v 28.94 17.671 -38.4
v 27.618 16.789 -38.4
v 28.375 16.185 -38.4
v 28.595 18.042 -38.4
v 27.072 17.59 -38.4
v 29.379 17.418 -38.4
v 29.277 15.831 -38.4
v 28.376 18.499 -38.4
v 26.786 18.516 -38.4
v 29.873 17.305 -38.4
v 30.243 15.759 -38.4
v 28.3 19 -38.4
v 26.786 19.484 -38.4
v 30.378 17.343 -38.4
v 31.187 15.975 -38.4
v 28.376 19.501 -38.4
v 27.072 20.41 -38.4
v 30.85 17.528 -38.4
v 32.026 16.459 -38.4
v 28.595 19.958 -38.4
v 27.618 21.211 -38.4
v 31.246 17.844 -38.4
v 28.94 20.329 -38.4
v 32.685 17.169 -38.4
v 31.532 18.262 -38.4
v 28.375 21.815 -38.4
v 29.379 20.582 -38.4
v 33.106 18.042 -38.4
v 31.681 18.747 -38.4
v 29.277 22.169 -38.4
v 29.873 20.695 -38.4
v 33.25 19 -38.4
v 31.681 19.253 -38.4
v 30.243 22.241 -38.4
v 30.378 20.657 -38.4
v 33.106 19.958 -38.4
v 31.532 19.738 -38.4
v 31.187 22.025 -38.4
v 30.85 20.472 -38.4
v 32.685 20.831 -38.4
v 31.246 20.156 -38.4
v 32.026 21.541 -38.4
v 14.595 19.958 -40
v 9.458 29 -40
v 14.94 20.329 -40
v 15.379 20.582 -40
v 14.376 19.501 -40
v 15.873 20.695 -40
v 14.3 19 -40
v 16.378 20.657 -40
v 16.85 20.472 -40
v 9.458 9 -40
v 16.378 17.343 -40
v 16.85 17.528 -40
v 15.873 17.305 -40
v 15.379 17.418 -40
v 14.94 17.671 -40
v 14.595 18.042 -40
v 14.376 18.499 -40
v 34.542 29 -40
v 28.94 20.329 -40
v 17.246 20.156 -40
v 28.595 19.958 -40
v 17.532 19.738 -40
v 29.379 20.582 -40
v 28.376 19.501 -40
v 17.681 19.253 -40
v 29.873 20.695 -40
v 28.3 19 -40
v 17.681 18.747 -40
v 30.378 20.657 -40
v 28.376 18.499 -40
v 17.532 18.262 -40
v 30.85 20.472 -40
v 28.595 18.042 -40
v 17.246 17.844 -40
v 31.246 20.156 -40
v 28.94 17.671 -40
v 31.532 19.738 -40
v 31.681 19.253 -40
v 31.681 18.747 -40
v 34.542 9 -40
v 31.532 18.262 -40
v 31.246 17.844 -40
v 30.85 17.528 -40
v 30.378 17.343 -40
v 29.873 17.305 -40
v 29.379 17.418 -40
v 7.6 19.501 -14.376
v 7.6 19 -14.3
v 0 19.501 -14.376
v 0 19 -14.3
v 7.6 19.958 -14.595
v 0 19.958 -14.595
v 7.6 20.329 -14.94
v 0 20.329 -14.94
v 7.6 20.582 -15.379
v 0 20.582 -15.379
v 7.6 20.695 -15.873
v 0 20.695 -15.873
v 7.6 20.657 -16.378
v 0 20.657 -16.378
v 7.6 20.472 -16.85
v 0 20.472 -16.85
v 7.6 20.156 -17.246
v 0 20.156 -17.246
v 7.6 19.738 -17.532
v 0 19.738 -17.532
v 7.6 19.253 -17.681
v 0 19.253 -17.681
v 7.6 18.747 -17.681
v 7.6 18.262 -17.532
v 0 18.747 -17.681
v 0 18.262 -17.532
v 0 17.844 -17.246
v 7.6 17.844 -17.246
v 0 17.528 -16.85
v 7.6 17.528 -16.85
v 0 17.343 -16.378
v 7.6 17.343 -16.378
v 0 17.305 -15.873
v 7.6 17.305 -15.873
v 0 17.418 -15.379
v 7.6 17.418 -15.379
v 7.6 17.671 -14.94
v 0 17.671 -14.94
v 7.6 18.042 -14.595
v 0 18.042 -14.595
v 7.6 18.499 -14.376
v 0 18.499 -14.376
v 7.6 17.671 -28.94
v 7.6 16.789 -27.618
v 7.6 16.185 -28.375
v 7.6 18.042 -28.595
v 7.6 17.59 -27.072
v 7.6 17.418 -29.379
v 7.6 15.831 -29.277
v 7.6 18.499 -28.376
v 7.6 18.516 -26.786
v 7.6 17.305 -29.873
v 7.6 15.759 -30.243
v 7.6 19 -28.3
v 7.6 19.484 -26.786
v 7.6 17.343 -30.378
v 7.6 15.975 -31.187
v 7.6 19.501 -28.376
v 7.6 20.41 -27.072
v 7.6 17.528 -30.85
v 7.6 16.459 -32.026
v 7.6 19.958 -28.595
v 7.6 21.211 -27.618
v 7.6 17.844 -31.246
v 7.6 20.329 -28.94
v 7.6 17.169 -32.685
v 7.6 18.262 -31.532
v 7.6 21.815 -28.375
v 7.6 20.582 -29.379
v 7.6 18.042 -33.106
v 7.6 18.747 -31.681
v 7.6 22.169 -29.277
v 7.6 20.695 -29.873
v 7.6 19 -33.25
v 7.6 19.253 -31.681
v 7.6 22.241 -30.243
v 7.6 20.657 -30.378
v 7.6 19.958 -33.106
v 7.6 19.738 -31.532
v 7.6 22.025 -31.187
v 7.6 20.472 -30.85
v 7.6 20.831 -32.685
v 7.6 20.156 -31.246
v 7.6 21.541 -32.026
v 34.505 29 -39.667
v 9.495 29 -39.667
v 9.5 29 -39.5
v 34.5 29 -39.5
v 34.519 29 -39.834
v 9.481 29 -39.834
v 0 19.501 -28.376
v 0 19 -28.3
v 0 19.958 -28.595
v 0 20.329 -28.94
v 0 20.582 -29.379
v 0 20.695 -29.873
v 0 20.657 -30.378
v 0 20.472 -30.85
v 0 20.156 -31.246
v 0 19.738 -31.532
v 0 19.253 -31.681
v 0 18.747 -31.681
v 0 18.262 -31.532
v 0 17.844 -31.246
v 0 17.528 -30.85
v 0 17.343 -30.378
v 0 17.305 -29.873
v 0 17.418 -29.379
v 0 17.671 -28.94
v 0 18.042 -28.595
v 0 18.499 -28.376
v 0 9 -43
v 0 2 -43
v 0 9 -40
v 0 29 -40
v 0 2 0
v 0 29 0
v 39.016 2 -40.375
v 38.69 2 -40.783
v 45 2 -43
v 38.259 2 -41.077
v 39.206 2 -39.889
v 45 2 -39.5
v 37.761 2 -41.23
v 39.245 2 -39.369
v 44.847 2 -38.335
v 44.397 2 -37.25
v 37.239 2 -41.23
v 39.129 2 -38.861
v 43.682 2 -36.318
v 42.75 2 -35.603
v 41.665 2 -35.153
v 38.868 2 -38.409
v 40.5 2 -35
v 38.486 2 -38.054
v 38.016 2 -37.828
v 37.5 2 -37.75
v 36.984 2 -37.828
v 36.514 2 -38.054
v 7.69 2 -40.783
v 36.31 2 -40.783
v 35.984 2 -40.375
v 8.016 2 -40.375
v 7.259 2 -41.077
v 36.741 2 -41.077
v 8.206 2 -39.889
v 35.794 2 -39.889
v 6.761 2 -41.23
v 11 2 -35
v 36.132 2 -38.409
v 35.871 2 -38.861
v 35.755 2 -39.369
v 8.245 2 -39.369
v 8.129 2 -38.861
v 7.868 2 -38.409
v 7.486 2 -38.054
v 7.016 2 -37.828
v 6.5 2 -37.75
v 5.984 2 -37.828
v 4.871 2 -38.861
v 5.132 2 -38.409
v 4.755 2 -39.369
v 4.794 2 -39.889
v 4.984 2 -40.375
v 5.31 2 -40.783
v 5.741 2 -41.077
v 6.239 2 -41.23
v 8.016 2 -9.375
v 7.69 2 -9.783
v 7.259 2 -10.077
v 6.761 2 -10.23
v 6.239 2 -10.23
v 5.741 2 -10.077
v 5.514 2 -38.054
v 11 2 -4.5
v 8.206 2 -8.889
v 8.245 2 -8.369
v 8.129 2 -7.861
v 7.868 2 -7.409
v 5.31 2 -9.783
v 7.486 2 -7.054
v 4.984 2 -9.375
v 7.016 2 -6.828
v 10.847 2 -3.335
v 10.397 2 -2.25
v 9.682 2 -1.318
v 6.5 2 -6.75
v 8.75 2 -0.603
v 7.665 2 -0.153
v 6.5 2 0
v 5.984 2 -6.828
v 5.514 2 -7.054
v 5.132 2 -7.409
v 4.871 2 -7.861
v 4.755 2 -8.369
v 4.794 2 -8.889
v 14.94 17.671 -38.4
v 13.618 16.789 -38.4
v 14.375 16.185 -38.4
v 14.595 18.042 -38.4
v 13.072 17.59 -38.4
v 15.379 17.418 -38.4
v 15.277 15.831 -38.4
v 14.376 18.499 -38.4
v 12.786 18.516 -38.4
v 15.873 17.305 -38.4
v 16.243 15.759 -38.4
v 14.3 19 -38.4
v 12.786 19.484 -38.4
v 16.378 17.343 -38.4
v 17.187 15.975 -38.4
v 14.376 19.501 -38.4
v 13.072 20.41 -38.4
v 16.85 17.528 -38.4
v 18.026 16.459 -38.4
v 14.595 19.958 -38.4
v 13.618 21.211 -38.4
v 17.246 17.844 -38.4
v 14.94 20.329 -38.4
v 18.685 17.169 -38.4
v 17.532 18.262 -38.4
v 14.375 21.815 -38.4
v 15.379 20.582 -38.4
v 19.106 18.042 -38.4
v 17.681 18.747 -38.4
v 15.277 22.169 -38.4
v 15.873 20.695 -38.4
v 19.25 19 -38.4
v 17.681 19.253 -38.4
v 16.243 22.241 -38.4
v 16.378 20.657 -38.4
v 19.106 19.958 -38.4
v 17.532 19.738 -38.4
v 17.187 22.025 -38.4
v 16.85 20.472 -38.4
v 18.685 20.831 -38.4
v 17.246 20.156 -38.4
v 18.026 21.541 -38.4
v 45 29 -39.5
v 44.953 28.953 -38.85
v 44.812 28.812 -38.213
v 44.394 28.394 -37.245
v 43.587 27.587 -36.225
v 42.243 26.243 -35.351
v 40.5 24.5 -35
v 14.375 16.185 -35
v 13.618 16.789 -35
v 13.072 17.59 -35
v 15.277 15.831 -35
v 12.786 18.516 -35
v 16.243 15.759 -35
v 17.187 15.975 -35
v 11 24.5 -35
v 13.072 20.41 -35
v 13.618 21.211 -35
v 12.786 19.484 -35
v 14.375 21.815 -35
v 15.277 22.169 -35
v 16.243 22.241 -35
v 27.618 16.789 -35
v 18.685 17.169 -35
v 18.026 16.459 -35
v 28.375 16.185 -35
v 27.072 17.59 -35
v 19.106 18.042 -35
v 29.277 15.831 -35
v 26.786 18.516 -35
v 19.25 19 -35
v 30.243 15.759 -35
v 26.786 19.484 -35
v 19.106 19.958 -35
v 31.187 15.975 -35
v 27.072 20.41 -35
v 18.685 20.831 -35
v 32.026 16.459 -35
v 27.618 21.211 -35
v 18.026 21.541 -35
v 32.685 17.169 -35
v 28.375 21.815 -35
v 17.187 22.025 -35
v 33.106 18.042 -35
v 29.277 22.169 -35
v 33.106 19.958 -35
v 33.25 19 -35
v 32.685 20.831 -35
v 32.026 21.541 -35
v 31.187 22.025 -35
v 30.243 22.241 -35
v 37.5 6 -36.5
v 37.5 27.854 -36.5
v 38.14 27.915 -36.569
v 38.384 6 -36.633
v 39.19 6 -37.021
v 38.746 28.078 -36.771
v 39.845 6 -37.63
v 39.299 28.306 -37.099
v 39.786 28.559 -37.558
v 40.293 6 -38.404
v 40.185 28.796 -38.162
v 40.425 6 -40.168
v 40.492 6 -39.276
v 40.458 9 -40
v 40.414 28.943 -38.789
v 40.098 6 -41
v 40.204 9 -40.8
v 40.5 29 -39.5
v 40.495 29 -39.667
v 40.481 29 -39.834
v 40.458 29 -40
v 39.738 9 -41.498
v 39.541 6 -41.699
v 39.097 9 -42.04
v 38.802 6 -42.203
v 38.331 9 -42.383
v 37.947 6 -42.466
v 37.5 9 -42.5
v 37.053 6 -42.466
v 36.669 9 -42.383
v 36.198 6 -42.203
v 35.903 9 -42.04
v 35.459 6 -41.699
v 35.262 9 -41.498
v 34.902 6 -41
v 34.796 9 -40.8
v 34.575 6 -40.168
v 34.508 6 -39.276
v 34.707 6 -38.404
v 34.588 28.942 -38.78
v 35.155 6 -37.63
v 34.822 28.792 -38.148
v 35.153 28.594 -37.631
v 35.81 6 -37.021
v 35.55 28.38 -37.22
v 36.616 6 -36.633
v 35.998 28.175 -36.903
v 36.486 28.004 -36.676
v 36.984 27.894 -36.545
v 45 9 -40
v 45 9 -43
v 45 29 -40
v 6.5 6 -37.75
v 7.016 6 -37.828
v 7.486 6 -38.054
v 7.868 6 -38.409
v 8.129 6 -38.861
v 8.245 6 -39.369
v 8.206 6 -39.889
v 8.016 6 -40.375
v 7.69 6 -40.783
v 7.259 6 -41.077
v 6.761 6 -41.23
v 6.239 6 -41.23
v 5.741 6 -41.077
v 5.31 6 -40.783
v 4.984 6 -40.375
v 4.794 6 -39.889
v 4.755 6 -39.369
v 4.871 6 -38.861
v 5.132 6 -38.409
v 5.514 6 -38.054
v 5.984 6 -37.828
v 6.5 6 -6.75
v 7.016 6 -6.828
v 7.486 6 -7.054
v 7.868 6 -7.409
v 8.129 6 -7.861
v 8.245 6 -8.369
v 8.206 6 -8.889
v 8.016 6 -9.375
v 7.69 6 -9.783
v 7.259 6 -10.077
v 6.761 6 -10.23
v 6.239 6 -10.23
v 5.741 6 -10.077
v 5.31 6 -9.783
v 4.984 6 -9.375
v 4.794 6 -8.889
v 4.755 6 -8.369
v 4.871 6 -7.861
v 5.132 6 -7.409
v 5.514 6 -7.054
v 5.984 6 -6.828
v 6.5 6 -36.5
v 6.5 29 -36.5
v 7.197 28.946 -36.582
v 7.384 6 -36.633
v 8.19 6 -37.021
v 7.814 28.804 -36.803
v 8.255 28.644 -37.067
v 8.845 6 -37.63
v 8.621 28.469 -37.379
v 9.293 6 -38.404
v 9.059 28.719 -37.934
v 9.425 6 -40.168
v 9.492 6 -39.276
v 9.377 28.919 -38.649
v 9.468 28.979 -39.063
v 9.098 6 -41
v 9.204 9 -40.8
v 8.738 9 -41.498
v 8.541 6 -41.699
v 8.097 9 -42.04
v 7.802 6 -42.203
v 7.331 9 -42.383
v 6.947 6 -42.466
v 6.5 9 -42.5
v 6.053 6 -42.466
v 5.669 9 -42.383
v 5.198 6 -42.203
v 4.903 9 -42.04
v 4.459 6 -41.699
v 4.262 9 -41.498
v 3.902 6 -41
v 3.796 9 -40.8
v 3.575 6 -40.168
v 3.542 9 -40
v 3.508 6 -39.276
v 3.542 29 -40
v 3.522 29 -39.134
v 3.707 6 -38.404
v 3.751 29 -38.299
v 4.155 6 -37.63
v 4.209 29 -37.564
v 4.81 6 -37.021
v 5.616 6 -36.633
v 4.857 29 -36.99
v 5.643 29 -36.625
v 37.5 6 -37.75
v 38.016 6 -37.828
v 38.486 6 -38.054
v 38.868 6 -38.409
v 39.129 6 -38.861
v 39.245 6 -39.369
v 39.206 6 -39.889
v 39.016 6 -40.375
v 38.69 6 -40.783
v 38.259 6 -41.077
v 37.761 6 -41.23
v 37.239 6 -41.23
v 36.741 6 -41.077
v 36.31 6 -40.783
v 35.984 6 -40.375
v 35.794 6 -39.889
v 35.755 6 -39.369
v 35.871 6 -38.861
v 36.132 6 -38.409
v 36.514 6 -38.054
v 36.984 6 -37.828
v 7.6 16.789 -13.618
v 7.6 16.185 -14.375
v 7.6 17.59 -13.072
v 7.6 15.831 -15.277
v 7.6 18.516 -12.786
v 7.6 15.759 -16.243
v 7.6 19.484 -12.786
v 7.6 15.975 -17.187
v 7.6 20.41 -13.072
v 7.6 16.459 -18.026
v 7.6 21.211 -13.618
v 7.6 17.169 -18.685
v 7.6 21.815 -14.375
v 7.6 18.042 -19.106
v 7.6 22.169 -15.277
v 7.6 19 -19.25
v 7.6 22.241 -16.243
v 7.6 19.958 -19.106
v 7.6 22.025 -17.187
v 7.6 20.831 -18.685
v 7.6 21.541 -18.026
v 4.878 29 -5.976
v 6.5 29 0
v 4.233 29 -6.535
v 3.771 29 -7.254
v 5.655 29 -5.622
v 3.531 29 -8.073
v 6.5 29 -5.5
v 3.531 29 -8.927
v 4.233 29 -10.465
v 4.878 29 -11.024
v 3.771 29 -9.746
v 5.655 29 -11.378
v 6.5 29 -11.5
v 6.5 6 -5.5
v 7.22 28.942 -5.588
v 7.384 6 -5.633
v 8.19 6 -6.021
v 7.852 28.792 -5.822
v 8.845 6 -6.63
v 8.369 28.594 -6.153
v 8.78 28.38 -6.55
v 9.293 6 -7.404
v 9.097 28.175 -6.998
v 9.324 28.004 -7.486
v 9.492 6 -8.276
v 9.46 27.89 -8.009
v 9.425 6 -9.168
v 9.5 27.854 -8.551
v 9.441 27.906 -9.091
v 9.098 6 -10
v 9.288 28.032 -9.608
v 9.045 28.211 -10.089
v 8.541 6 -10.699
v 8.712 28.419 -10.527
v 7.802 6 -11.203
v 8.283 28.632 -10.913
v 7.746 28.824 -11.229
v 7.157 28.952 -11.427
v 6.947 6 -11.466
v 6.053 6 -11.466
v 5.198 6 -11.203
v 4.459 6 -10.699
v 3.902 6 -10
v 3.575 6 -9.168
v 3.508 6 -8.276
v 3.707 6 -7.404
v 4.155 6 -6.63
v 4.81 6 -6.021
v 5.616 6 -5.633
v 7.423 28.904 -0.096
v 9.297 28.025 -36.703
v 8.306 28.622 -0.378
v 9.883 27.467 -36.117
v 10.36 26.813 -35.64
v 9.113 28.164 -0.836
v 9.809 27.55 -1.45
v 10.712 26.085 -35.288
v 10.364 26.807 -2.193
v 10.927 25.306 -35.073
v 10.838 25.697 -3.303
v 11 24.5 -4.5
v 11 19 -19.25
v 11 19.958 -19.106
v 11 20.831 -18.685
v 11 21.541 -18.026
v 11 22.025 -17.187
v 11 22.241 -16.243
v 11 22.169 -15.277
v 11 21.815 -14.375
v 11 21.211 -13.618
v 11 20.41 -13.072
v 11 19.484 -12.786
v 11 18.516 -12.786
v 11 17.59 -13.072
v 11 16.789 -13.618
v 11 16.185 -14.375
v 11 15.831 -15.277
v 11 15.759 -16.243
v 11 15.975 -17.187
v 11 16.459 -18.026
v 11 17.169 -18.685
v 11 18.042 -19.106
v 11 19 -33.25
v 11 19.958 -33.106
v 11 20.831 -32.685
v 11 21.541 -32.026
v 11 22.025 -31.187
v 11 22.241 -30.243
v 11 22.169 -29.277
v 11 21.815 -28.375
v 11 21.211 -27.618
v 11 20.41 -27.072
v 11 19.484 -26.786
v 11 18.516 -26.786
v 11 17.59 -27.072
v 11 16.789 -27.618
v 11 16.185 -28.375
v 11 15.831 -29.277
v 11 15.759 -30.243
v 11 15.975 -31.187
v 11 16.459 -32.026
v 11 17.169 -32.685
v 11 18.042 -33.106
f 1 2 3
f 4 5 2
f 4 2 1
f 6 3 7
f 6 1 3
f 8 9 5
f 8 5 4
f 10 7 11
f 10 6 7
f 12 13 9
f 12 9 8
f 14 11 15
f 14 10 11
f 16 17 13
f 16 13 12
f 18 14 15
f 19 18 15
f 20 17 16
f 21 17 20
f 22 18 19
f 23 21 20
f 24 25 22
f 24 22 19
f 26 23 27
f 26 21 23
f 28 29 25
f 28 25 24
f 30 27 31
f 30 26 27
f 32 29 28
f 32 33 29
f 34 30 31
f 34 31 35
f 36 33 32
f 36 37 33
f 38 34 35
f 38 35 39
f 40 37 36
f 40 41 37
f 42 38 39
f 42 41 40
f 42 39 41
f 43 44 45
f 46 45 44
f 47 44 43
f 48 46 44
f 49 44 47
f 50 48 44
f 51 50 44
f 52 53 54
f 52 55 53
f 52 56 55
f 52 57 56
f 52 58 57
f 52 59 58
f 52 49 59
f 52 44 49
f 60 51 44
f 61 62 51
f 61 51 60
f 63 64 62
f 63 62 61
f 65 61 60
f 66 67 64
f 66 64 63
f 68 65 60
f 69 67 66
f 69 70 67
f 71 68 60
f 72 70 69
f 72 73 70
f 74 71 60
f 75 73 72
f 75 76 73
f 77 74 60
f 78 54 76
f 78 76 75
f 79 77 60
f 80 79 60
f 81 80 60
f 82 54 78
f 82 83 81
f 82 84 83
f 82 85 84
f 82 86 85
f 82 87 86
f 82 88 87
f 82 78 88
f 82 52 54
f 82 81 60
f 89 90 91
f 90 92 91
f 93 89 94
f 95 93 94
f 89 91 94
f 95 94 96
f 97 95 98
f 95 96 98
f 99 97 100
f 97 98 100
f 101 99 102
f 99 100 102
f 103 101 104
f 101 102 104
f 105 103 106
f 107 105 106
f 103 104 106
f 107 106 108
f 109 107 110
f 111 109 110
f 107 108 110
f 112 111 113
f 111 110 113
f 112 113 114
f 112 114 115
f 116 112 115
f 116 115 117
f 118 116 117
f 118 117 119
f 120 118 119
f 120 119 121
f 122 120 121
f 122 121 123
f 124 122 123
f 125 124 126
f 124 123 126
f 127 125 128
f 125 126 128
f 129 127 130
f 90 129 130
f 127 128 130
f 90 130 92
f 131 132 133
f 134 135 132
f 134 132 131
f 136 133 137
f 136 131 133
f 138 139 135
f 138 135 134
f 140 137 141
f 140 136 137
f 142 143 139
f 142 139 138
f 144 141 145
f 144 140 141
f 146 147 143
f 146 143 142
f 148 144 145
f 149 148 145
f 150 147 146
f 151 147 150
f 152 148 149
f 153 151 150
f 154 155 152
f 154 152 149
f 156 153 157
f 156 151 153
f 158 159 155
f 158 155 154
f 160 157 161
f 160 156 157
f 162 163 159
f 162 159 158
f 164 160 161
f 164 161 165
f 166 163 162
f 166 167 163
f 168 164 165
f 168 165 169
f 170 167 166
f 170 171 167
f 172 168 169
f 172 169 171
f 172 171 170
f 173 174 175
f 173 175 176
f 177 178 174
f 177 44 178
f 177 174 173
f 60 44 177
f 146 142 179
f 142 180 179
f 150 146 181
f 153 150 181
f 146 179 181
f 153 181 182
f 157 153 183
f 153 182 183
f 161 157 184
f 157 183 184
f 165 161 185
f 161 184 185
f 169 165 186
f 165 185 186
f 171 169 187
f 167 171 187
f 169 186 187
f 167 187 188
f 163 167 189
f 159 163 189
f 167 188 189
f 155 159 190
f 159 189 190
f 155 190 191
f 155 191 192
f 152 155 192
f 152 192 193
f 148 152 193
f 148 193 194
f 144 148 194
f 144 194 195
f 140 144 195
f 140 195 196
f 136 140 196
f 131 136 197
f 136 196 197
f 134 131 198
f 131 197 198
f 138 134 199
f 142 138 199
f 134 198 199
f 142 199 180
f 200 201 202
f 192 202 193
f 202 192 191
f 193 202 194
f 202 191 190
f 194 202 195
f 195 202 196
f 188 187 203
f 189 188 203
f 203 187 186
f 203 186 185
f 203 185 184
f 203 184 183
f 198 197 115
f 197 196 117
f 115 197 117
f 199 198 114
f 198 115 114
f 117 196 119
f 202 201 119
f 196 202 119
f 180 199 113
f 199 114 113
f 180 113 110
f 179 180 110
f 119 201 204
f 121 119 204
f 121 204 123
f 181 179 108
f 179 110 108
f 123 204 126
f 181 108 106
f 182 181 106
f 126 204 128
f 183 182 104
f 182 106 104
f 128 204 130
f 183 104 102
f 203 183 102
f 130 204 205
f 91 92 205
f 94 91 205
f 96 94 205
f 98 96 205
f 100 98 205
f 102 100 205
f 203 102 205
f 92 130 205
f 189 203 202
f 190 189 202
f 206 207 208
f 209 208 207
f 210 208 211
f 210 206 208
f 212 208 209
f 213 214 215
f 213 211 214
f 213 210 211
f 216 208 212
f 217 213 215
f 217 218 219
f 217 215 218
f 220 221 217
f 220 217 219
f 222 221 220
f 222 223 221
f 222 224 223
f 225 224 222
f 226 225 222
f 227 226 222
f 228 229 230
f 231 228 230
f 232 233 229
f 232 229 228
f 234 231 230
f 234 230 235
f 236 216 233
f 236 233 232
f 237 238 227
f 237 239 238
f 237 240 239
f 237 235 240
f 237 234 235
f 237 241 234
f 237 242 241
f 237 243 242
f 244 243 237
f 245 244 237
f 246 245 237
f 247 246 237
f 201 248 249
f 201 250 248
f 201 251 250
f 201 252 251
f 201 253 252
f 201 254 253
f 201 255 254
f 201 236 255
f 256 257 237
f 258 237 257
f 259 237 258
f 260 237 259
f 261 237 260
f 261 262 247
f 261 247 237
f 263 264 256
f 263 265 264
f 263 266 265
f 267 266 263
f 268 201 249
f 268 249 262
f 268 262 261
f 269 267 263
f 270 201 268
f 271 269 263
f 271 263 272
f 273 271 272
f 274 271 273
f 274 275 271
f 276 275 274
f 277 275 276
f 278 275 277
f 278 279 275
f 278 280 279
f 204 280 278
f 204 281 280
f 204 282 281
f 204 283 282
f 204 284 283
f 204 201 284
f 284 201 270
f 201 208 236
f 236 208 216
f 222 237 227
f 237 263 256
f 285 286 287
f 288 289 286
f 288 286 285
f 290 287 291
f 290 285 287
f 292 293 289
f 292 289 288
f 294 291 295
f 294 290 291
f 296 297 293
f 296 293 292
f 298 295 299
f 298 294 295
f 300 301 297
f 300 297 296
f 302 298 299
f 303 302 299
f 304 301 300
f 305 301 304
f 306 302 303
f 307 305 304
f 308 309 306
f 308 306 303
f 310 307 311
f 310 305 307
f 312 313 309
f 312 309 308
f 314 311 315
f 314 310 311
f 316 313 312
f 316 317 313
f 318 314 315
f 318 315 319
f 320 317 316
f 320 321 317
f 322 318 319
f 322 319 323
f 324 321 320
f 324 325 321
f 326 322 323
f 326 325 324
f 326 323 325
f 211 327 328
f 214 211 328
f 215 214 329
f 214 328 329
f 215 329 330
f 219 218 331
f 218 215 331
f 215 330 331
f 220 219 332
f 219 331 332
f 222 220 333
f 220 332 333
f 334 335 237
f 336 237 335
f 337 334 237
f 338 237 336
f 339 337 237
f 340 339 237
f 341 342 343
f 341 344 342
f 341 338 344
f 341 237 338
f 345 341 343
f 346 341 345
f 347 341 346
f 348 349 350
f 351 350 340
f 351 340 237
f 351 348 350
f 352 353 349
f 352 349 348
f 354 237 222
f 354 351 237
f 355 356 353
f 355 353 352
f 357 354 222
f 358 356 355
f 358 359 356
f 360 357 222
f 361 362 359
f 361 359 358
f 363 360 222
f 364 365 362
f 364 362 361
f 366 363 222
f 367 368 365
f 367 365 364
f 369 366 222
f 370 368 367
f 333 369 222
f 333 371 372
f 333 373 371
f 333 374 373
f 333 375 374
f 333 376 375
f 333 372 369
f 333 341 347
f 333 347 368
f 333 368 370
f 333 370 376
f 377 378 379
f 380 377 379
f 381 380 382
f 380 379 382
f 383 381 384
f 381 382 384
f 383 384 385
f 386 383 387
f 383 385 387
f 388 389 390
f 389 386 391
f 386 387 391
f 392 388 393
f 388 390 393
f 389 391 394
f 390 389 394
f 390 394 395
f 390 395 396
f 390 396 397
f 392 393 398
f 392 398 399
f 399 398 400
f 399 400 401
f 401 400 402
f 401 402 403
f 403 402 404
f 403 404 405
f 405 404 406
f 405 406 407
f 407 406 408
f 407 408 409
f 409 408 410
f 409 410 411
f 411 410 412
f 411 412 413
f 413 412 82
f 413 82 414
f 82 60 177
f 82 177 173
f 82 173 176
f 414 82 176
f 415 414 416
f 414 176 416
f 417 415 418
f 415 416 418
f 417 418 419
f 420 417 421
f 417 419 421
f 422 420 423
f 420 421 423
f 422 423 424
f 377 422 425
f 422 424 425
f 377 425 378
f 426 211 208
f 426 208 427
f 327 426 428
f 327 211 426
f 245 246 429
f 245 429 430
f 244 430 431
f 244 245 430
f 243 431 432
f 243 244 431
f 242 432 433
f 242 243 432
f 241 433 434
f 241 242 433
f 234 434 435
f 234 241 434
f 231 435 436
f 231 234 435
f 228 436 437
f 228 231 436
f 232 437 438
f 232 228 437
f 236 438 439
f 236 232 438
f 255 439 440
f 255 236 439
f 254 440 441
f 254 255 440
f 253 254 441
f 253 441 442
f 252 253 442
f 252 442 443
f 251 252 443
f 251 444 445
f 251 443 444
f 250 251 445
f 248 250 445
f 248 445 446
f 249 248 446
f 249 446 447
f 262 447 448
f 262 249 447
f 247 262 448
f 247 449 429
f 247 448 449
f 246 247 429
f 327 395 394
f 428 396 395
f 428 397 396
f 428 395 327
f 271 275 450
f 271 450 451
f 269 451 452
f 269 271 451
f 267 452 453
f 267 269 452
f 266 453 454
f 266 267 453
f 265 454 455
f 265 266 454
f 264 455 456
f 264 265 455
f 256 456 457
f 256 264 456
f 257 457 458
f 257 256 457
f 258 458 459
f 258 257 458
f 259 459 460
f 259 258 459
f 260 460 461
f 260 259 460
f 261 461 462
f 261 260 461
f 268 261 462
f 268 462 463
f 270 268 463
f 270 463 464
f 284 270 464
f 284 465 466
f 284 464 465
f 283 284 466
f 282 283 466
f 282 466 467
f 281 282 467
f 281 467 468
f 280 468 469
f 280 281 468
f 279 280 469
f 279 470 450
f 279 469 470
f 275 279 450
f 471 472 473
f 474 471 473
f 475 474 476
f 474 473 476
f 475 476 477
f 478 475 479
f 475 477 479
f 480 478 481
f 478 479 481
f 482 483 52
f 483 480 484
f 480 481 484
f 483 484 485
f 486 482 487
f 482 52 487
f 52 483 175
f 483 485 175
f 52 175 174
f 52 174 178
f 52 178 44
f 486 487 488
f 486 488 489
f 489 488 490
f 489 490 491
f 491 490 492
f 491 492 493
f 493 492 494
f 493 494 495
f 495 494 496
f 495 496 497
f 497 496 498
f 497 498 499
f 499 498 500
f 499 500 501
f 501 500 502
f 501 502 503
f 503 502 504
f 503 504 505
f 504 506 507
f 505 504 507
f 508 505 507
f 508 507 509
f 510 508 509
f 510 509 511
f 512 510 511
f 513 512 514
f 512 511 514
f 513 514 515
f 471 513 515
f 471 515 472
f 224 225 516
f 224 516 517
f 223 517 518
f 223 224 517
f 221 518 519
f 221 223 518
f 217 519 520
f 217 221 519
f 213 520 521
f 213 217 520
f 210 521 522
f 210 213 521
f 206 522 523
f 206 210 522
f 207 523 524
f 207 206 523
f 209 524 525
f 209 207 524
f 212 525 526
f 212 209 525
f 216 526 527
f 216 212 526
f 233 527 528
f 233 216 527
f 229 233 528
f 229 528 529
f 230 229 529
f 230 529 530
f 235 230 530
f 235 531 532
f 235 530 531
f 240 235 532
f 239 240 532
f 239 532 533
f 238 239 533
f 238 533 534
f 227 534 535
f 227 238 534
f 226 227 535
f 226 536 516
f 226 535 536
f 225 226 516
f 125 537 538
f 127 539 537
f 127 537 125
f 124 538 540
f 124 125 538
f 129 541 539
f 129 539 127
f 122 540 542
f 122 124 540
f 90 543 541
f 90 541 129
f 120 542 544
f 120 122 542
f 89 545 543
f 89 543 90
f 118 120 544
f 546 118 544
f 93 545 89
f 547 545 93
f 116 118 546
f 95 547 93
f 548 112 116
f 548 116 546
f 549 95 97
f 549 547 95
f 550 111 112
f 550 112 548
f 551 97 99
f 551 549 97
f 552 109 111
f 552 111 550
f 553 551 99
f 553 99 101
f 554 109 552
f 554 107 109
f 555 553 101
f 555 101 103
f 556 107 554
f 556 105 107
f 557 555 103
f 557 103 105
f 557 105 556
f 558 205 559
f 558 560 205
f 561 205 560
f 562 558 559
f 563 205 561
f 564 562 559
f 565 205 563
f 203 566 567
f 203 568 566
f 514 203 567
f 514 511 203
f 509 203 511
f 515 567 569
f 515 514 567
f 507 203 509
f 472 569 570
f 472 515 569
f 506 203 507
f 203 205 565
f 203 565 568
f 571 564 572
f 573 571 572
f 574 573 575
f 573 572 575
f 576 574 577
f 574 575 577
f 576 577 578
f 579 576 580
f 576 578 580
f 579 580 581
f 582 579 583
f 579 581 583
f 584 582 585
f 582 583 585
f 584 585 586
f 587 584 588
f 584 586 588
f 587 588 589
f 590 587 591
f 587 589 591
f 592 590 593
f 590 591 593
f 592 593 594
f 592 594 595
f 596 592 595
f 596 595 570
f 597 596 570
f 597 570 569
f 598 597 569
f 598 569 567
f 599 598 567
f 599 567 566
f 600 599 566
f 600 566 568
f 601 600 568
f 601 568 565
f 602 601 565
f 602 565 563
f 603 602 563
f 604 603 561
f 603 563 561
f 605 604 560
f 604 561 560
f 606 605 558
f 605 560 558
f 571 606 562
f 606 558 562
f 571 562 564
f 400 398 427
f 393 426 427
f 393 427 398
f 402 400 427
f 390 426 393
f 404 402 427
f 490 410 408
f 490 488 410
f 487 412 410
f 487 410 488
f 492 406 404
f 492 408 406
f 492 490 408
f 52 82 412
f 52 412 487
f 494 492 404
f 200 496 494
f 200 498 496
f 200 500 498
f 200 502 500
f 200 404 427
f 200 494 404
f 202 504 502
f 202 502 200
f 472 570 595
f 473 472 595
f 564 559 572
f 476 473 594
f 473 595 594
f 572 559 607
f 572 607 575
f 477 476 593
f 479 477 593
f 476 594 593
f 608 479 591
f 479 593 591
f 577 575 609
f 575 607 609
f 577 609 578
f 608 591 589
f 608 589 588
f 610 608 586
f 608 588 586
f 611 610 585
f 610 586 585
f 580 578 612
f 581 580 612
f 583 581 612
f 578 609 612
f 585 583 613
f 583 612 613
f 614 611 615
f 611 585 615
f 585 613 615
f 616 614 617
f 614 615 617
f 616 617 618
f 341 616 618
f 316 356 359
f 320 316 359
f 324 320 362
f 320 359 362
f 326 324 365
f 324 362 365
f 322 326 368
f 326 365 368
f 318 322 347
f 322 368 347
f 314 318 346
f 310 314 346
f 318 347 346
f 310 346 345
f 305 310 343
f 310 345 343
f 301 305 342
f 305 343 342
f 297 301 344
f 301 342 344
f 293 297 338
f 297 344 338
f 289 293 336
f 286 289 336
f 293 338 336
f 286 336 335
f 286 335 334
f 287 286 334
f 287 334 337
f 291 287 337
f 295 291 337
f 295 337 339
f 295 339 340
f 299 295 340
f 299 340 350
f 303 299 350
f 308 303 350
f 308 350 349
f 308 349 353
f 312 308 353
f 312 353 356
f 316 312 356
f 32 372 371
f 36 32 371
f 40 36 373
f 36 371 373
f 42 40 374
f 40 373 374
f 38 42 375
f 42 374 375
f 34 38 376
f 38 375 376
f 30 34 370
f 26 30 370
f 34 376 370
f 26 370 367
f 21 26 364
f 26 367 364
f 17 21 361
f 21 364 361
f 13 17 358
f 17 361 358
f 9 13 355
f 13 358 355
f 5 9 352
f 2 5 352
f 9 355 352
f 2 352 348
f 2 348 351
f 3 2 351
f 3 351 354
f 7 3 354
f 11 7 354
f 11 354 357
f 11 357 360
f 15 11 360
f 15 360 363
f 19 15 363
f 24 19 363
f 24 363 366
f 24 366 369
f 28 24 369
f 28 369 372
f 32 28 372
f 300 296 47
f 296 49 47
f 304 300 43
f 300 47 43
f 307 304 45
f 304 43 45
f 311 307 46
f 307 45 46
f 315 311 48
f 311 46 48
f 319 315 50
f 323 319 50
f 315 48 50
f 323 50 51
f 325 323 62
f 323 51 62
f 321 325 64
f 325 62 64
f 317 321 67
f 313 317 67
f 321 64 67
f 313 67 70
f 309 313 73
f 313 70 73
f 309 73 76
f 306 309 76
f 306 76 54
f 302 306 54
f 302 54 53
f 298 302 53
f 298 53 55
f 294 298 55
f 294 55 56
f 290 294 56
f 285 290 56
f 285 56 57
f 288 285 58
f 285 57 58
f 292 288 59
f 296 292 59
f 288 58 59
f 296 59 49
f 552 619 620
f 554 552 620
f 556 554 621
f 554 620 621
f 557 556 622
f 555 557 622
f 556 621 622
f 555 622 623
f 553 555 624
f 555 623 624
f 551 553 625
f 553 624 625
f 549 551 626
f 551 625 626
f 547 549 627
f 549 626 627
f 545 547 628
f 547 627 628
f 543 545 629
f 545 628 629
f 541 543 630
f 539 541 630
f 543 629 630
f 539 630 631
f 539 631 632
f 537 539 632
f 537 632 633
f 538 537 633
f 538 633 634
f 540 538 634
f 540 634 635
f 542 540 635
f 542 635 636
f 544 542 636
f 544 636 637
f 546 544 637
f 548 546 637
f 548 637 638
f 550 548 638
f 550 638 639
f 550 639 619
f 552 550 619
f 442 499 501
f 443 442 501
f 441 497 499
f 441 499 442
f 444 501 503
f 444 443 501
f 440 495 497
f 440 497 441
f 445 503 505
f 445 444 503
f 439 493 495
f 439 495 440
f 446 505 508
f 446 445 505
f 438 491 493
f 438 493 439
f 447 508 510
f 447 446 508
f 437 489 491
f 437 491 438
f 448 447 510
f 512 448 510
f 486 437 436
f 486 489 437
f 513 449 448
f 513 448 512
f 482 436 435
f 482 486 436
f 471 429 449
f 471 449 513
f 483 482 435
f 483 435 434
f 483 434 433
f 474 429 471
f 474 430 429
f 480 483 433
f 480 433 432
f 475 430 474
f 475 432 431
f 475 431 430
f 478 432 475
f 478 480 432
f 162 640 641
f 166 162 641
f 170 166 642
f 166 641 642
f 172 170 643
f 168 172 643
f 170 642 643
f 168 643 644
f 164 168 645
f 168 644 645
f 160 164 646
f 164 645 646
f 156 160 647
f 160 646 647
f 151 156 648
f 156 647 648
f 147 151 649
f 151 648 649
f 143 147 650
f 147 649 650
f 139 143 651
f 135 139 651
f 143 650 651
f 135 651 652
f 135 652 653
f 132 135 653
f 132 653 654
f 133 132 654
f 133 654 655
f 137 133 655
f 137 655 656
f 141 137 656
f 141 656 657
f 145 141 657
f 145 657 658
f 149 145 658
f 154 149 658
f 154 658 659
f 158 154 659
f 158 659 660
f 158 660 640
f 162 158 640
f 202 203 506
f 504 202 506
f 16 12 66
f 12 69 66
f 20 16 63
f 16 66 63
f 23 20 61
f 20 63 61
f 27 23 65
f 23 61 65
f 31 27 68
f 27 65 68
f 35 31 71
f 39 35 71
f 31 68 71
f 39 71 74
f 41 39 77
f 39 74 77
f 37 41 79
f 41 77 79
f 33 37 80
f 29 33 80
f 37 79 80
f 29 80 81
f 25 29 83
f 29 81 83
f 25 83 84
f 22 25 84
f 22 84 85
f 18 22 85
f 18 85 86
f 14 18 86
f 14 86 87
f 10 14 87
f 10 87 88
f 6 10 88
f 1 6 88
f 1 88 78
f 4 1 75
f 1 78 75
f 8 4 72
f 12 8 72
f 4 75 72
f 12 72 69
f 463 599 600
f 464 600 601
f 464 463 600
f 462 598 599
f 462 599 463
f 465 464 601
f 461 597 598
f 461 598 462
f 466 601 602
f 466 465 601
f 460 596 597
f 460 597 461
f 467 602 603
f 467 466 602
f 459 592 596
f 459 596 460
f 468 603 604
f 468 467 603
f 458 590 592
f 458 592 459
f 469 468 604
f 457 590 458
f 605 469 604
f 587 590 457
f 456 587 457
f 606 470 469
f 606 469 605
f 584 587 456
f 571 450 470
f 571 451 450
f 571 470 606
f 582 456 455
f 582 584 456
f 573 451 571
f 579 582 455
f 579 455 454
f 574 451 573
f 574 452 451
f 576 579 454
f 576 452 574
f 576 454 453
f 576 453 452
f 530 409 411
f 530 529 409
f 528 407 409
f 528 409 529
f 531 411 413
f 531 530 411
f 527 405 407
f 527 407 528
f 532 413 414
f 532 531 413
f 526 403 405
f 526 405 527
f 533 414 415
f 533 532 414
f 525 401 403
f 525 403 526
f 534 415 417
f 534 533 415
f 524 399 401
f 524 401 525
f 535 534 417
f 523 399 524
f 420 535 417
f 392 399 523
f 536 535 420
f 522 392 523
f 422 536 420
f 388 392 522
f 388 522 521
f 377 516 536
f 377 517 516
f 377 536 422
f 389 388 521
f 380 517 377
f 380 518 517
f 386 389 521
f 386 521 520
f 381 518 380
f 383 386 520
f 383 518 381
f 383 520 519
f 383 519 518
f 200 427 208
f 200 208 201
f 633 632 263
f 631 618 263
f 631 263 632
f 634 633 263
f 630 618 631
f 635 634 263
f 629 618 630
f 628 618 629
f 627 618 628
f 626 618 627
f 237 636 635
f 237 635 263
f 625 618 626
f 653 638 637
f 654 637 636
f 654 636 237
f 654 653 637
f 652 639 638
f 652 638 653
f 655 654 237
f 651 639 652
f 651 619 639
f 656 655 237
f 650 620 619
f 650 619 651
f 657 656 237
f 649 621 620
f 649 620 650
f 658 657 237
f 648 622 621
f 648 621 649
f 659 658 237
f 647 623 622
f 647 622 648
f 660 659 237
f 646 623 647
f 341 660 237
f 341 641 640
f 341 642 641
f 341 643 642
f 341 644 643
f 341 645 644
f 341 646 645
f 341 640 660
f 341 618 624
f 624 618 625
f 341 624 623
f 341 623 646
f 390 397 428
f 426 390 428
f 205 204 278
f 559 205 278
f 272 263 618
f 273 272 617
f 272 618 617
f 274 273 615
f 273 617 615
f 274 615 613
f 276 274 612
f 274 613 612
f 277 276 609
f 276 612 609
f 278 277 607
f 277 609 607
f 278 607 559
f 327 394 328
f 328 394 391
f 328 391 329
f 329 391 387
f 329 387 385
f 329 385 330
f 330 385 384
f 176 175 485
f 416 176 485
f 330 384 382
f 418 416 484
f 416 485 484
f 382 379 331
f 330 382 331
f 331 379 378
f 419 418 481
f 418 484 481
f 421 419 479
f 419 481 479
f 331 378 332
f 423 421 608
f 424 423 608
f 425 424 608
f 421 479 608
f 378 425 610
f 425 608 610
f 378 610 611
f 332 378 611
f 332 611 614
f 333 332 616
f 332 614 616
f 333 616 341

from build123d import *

# Parameters (mm, degrees)
SKETCH1_W                                           = 45
SKETCH1_H                                           = 40
BOSS_EXTRUDE1_DEPTH                                 = 29
SKETCH33_W                                          = 34
SKETCH33_H                                          = 35
CUT_EXTRUDE7_DEPTH                                  = 67.828137786
SKETCH39_W                                          = 45
SKETCH39_H                                          = 9
BOSS_EXTRUDE2_DEPTH                                 = 3
CUT_EXTRUDE6_DEPTH                                  = 69.6658576
CUT_EXTRUDE6_DEPTH_BACK                             = 69.6658576
SKETCH21_R                                          = 1.75
SKETCH34_R                                          = 3
CUT_EXTRUDE8_DEPTH                                  = 23
CBORE_FOR_M3_HEX_SOCKET_HEAD_CAP_SCREW1_D           = 3.4
CBORE_FOR_M3_HEX_SOCKET_HEAD_CAP_SCREW1_CBORE_D     = 6.5
CBORE_FOR_M3_HEX_SOCKET_HEAD_CAP_SCREW1_CBORE_DEPTH = 3.4
CBORE_FOR_M3_HEX_SOCKET_HEAD_CAP_SCREW2_D           = 3.4
CBORE_FOR_M3_HEX_SOCKET_HEAD_CAP_SCREW2_CBORE_D     = 6.5
CBORE_FOR_M3_HEX_SOCKET_HEAD_CAP_SCREW2_CBORE_DEPTH = 3.4
FILLET1_R                                           = 4.5
SKETCH40_W                                          = 43
SKETCH40_H                                          = 2
CUT_EXTRUDE9_DEPTH                                  = 69.665857708


with BuildPart() as part:
    # Sketch1 → Boss-Extrude1 (new body)
    with BuildSketch(Plane(origin=(0, 0, 0), x_dir=(1, 0, 0), z_dir=(0, 1, 0))):
        with Locations((22.5, 20)):
            Rectangle(SKETCH1_W, SKETCH1_H)
    extrude(amount=BOSS_EXTRUDE1_DEPTH)

    # Sketch33 → Cut-Extrude7 (cut, through all)
    with BuildSketch(Plane(origin=(0, 29, 0), x_dir=(1, 0, 0), z_dir=(0, 1, 0))):
        with Locations((28, 17.5)):
            Rectangle(SKETCH33_W, SKETCH33_H)
    extrude(amount=-CUT_EXTRUDE7_DEPTH, mode=Mode.SUBTRACT)

    # Sketch39 → Boss-Extrude2 (add)
    with BuildSketch(Plane(origin=(0, 0, -40), x_dir=(-1, 0, 0), z_dir=(0, 0, -1))):
        with Locations((-22.5, 4.5)):
            Rectangle(SKETCH39_W, SKETCH39_H)
    extrude(amount=BOSS_EXTRUDE2_DEPTH)

    # Sketch21 → Cut-Extrude6 (cut, two sides: drawn at the far end of the back side and taken through both)
    with BuildSketch(Plane(origin=(0, 29, 0), x_dir=(1, 0, 0), z_dir=(0, 1, 0)).offset(-CUT_EXTRUDE6_DEPTH_BACK)):
        with Locations(Location((6.5, 39.5, 0), (0, 0, 270))):
            Circle(SKETCH21_R)
        with Locations(Location((6.5, 8.5, 0), (0, 0, 270))):
            Circle(SKETCH21_R)
        with Locations(Location((37.5, 39.5, 0), (0, 0, 270))):
            Circle(SKETCH21_R)
    extrude(amount=CUT_EXTRUDE6_DEPTH + CUT_EXTRUDE6_DEPTH_BACK, mode=Mode.SUBTRACT)

    # Sketch34 → Cut-Extrude8 (cut)
    with BuildSketch(Plane(origin=(0, 29, 0), x_dir=(1, 0, 0), z_dir=(0, 1, 0))):
        with Locations(Location((6.5, 8.5, 0), (0, 0, 270))):
            Circle(SKETCH34_R)
        with Locations(Location((6.5, 39.5, 0), (0, 0, 270))):
            Circle(SKETCH34_R)
        with Locations(Location((37.5, 39.5, 0), (0, 0, 270))):
            Circle(SKETCH34_R)
    extrude(amount=-CUT_EXTRUDE8_DEPTH, mode=Mode.SUBTRACT)

    # CBORE for M3 Hex Socket Head Cap Screw1 (through all)
    with Locations(Plane(origin=(11, 0, 0), x_dir=(0, 0, -1), z_dir=(1, 0, 0))):
        with Locations((16, 19), (30, 19)):
            CounterBoreHole(CBORE_FOR_M3_HEX_SOCKET_HEAD_CAP_SCREW1_D / 2, CBORE_FOR_M3_HEX_SOCKET_HEAD_CAP_SCREW1_CBORE_D / 2, CBORE_FOR_M3_HEX_SOCKET_HEAD_CAP_SCREW1_CBORE_DEPTH)

    # CBORE for M3 Hex Socket Head Cap Screw2 (through all)
    with Locations(Plane.XY.offset(-35)):
        with Locations((16, 19), (30, 19)):
            CounterBoreHole(CBORE_FOR_M3_HEX_SOCKET_HEAD_CAP_SCREW2_D / 2, CBORE_FOR_M3_HEX_SOCKET_HEAD_CAP_SCREW2_CBORE_D / 2, CBORE_FOR_M3_HEX_SOCKET_HEAD_CAP_SCREW2_CBORE_DEPTH)

    # Fillet1
    # the kernel refuses this fillet: 4.5 mm, written as the material it takes off along each edge
    with BuildSketch(Plane(origin=(45, 29, -35), x_dir=(0, 0, -1), z_dir=(0, -1, 0))) as fillet1_piece_1:
        with BuildLine():
            CenterArc((FILLET1_R, -FILLET1_R), FILLET1_R, 90, 90)
            Line((0, -FILLET1_R), (-FILLET1_R * 0.02, -FILLET1_R))
            Line((-FILLET1_R * 0.02, -FILLET1_R), (-FILLET1_R * 0.02, FILLET1_R * 0.02))
            Line((-FILLET1_R * 0.02, FILLET1_R * 0.02), (FILLET1_R, FILLET1_R * 0.02))
            Line((FILLET1_R, FILLET1_R * 0.02), (FILLET1_R, 0))
        make_face()
    extrude(amount=29, mode=Mode.SUBTRACT)
    with BuildSketch(Plane(origin=(11, 29, 0), x_dir=(-1, 0, 0), z_dir=(0, -1, 0))) as fillet1_piece_2:
        with BuildLine():
            CenterArc((FILLET1_R, FILLET1_R), FILLET1_R, 180, 90)
            Line((0, FILLET1_R), (-FILLET1_R * 0.02, FILLET1_R))
            Line((-FILLET1_R * 0.02, FILLET1_R), (-FILLET1_R * 0.02, -FILLET1_R * 0.02))
            Line((-FILLET1_R * 0.02, -FILLET1_R * 0.02), (FILLET1_R, -FILLET1_R * 0.02))
            Line((FILLET1_R, -FILLET1_R * 0.02), (FILLET1_R, 0))
        make_face()
    extrude(amount=29, mode=Mode.SUBTRACT)
    with BuildSketch(Plane(origin=(11, 29, -35), x_dir=(0, 0, -1), z_dir=(1, 0, 0))) as fillet1_piece_3:
        with BuildLine():
            CenterArc((FILLET1_R, -FILLET1_R), FILLET1_R, 90, 90)
            Line((0, -FILLET1_R), (-FILLET1_R * 0.02, -FILLET1_R))
            Line((-FILLET1_R * 0.02, -FILLET1_R), (-FILLET1_R * 0.02, FILLET1_R * 0.02))
            Line((-FILLET1_R * 0.02, FILLET1_R * 0.02), (FILLET1_R, FILLET1_R * 0.02))
            Line((FILLET1_R, FILLET1_R * 0.02), (FILLET1_R, 0))
        make_face()
    extrude(amount=34, mode=Mode.SUBTRACT)
    with BuildSketch(Plane(origin=(11, 29, 0), x_dir=(0, -1, 0), z_dir=(0, 0, -1))) as fillet1_piece_4:
        with BuildLine():
            CenterArc((FILLET1_R, FILLET1_R), FILLET1_R, 180, 90)
            Line((0, FILLET1_R), (-FILLET1_R * 0.02, FILLET1_R))
            Line((-FILLET1_R * 0.02, FILLET1_R), (-FILLET1_R * 0.02, -FILLET1_R * 0.02))
            Line((-FILLET1_R * 0.02, -FILLET1_R * 0.02), (FILLET1_R, -FILLET1_R * 0.02))
            Line((FILLET1_R, -FILLET1_R * 0.02), (FILLET1_R, 0))
        make_face()
    extrude(amount=35, mode=Mode.SUBTRACT)
    with BuildSketch(Plane(origin=(11, 29, -35), x_dir=(0, 0, -1), z_dir=(1, 0, 0))) as fillet1_piece_5a_section:
        with BuildLine():
            CenterArc((FILLET1_R, -FILLET1_R), FILLET1_R, 90, 90)
            Line((0, -FILLET1_R), (-FILLET1_R * 0.02, -FILLET1_R))
            Line((-FILLET1_R * 0.02, -FILLET1_R), (-FILLET1_R * 0.02, FILLET1_R * 0.02))
            Line((-FILLET1_R * 0.02, FILLET1_R * 0.02), (FILLET1_R, FILLET1_R * 0.02))
            Line((FILLET1_R, FILLET1_R * 0.02), (FILLET1_R, 0))
        make_face()
    fillet1_piece_5a = extrude(amount=45.25, mode=Mode.PRIVATE)
    fillet1_piece_5a = split(fillet1_piece_5a, bisect_by=Plane(origin=(45, 27.981221986, -36.018778014), z_dir=(1, 0, 0)), keep=Keep.TOP, mode=Mode.PRIVATE)
    with BuildSketch(Plane(origin=(45, 40.25, -35), x_dir=(0, 0, -1), z_dir=(0, -1, 0))) as fillet1_piece_5b_section:
        with BuildLine():
            CenterArc((FILLET1_R, -FILLET1_R), FILLET1_R, 90, 90)
            Line((0, -FILLET1_R), (-FILLET1_R * 0.02, -FILLET1_R))
            Line((-FILLET1_R * 0.02, -FILLET1_R), (-FILLET1_R * 0.02, FILLET1_R * 0.02))
            Line((-FILLET1_R * 0.02, FILLET1_R * 0.02), (FILLET1_R, FILLET1_R * 0.02))
            Line((FILLET1_R, FILLET1_R * 0.02), (FILLET1_R, 0))
        make_face()
    fillet1_piece_5b = extrude(amount=40.25, mode=Mode.PRIVATE)
    fillet1_piece_5b = split(fillet1_piece_5b, bisect_by=Plane(origin=(43.981221986, 29, -36.018778014), z_dir=(0, 1, 0)), keep=Keep.TOP, mode=Mode.PRIVATE)
    fillet1_piece_5 = fillet1_piece_5a & fillet1_piece_5b
    add(fillet1_piece_5, mode=Mode.SUBTRACT)
    with BuildSketch(Plane(origin=(11, 40.25, 0), x_dir=(-1, 0, 0), z_dir=(0, -1, 0))) as fillet1_piece_6a_section:
        with BuildLine():
            CenterArc((FILLET1_R, FILLET1_R), FILLET1_R, 180, 90)
            Line((0, FILLET1_R), (-FILLET1_R * 0.02, FILLET1_R))
            Line((-FILLET1_R * 0.02, FILLET1_R), (-FILLET1_R * 0.02, -FILLET1_R * 0.02))
            Line((-FILLET1_R * 0.02, -FILLET1_R * 0.02), (FILLET1_R, -FILLET1_R * 0.02))
            Line((FILLET1_R, -FILLET1_R * 0.02), (FILLET1_R, 0))
        make_face()
    fillet1_piece_6a = extrude(amount=40.25, mode=Mode.PRIVATE)
    fillet1_piece_6a = split(fillet1_piece_6a, bisect_by=Plane(origin=(9.981221986, 29, -1.018778014), z_dir=(0, 1, 0)), keep=Keep.TOP, mode=Mode.PRIVATE)
    with BuildSketch(Plane(origin=(11, 29, 11.25), x_dir=(0, -1, 0), z_dir=(0, 0, -1))) as fillet1_piece_6b_section:
        with BuildLine():
            CenterArc((FILLET1_R, FILLET1_R), FILLET1_R, 180, 90)
            Line((0, FILLET1_R), (-FILLET1_R * 0.02, FILLET1_R))
            Line((-FILLET1_R * 0.02, FILLET1_R), (-FILLET1_R * 0.02, -FILLET1_R * 0.02))
            Line((-FILLET1_R * 0.02, -FILLET1_R * 0.02), (FILLET1_R, -FILLET1_R * 0.02))
            Line((FILLET1_R, -FILLET1_R * 0.02), (FILLET1_R, 0))
        make_face()
    fillet1_piece_6b = extrude(amount=46.25, mode=Mode.PRIVATE)
    fillet1_piece_6b = split(fillet1_piece_6b, bisect_by=Plane(origin=(9.981221986, 27.981221986, 0), z_dir=(0, 0, 1)), keep=Keep.TOP, mode=Mode.PRIVATE)
    fillet1_piece_6 = fillet1_piece_6a & fillet1_piece_6b
    add(fillet1_piece_6, mode=Mode.SUBTRACT)
    with BuildSketch(Plane(origin=(11, 29, 0), x_dir=(0, -1, 0), z_dir=(0, 0, -1))) as fillet1_piece_7a_section:
        with BuildLine():
            CenterArc((FILLET1_R, FILLET1_R), FILLET1_R, 180, 90)
            Line((0, FILLET1_R), (-FILLET1_R * 0.02, FILLET1_R))
            Line((-FILLET1_R * 0.02, FILLET1_R), (-FILLET1_R * 0.02, -FILLET1_R * 0.02))
            Line((-FILLET1_R * 0.02, -FILLET1_R * 0.02), (FILLET1_R, -FILLET1_R * 0.02))
            Line((FILLET1_R, -FILLET1_R * 0.02), (FILLET1_R, 0))
        make_face()
    fillet1_piece_7a = extrude(amount=46.25, mode=Mode.PRIVATE)
    fillet1_piece_7a = split(fillet1_piece_7a, bisect_by=Plane(origin=(9.981221986, 27.981221986, -35), z_dir=(0, 0, -1)), keep=Keep.TOP, mode=Mode.PRIVATE)
    with BuildSketch(Plane(origin=(-0.25, 29, -35), x_dir=(0, 0, -1), z_dir=(1, 0, 0))) as fillet1_piece_7b_section:
        with BuildLine():
            CenterArc((FILLET1_R, -FILLET1_R), FILLET1_R, 90, 90)
            Line((0, -FILLET1_R), (-FILLET1_R * 0.02, -FILLET1_R))
            Line((-FILLET1_R * 0.02, -FILLET1_R), (-FILLET1_R * 0.02, FILLET1_R * 0.02))
            Line((-FILLET1_R * 0.02, FILLET1_R * 0.02), (FILLET1_R, FILLET1_R * 0.02))
            Line((FILLET1_R, FILLET1_R * 0.02), (FILLET1_R, 0))
        make_face()
    fillet1_piece_7b = extrude(amount=45.25, mode=Mode.PRIVATE)
    fillet1_piece_7b = split(fillet1_piece_7b, bisect_by=Plane(origin=(11, 27.981221986, -36.018778014), z_dir=(-1, 0, 0)), keep=Keep.TOP, mode=Mode.PRIVATE)
    fillet1_piece_7 = fillet1_piece_7a & fillet1_piece_7b
    add(fillet1_piece_7, mode=Mode.SUBTRACT)

    # Sketch40 → Cut-Extrude9 (cut, through all)
    with BuildSketch(Plane.ZY):
        with Locations((-21.5, 1)):
            Rectangle(SKETCH40_W, SKETCH40_H)
    extrude(amount=-CUT_EXTRUDE9_DEPTH, mode=Mode.SUBTRACT)


solid = part.part
